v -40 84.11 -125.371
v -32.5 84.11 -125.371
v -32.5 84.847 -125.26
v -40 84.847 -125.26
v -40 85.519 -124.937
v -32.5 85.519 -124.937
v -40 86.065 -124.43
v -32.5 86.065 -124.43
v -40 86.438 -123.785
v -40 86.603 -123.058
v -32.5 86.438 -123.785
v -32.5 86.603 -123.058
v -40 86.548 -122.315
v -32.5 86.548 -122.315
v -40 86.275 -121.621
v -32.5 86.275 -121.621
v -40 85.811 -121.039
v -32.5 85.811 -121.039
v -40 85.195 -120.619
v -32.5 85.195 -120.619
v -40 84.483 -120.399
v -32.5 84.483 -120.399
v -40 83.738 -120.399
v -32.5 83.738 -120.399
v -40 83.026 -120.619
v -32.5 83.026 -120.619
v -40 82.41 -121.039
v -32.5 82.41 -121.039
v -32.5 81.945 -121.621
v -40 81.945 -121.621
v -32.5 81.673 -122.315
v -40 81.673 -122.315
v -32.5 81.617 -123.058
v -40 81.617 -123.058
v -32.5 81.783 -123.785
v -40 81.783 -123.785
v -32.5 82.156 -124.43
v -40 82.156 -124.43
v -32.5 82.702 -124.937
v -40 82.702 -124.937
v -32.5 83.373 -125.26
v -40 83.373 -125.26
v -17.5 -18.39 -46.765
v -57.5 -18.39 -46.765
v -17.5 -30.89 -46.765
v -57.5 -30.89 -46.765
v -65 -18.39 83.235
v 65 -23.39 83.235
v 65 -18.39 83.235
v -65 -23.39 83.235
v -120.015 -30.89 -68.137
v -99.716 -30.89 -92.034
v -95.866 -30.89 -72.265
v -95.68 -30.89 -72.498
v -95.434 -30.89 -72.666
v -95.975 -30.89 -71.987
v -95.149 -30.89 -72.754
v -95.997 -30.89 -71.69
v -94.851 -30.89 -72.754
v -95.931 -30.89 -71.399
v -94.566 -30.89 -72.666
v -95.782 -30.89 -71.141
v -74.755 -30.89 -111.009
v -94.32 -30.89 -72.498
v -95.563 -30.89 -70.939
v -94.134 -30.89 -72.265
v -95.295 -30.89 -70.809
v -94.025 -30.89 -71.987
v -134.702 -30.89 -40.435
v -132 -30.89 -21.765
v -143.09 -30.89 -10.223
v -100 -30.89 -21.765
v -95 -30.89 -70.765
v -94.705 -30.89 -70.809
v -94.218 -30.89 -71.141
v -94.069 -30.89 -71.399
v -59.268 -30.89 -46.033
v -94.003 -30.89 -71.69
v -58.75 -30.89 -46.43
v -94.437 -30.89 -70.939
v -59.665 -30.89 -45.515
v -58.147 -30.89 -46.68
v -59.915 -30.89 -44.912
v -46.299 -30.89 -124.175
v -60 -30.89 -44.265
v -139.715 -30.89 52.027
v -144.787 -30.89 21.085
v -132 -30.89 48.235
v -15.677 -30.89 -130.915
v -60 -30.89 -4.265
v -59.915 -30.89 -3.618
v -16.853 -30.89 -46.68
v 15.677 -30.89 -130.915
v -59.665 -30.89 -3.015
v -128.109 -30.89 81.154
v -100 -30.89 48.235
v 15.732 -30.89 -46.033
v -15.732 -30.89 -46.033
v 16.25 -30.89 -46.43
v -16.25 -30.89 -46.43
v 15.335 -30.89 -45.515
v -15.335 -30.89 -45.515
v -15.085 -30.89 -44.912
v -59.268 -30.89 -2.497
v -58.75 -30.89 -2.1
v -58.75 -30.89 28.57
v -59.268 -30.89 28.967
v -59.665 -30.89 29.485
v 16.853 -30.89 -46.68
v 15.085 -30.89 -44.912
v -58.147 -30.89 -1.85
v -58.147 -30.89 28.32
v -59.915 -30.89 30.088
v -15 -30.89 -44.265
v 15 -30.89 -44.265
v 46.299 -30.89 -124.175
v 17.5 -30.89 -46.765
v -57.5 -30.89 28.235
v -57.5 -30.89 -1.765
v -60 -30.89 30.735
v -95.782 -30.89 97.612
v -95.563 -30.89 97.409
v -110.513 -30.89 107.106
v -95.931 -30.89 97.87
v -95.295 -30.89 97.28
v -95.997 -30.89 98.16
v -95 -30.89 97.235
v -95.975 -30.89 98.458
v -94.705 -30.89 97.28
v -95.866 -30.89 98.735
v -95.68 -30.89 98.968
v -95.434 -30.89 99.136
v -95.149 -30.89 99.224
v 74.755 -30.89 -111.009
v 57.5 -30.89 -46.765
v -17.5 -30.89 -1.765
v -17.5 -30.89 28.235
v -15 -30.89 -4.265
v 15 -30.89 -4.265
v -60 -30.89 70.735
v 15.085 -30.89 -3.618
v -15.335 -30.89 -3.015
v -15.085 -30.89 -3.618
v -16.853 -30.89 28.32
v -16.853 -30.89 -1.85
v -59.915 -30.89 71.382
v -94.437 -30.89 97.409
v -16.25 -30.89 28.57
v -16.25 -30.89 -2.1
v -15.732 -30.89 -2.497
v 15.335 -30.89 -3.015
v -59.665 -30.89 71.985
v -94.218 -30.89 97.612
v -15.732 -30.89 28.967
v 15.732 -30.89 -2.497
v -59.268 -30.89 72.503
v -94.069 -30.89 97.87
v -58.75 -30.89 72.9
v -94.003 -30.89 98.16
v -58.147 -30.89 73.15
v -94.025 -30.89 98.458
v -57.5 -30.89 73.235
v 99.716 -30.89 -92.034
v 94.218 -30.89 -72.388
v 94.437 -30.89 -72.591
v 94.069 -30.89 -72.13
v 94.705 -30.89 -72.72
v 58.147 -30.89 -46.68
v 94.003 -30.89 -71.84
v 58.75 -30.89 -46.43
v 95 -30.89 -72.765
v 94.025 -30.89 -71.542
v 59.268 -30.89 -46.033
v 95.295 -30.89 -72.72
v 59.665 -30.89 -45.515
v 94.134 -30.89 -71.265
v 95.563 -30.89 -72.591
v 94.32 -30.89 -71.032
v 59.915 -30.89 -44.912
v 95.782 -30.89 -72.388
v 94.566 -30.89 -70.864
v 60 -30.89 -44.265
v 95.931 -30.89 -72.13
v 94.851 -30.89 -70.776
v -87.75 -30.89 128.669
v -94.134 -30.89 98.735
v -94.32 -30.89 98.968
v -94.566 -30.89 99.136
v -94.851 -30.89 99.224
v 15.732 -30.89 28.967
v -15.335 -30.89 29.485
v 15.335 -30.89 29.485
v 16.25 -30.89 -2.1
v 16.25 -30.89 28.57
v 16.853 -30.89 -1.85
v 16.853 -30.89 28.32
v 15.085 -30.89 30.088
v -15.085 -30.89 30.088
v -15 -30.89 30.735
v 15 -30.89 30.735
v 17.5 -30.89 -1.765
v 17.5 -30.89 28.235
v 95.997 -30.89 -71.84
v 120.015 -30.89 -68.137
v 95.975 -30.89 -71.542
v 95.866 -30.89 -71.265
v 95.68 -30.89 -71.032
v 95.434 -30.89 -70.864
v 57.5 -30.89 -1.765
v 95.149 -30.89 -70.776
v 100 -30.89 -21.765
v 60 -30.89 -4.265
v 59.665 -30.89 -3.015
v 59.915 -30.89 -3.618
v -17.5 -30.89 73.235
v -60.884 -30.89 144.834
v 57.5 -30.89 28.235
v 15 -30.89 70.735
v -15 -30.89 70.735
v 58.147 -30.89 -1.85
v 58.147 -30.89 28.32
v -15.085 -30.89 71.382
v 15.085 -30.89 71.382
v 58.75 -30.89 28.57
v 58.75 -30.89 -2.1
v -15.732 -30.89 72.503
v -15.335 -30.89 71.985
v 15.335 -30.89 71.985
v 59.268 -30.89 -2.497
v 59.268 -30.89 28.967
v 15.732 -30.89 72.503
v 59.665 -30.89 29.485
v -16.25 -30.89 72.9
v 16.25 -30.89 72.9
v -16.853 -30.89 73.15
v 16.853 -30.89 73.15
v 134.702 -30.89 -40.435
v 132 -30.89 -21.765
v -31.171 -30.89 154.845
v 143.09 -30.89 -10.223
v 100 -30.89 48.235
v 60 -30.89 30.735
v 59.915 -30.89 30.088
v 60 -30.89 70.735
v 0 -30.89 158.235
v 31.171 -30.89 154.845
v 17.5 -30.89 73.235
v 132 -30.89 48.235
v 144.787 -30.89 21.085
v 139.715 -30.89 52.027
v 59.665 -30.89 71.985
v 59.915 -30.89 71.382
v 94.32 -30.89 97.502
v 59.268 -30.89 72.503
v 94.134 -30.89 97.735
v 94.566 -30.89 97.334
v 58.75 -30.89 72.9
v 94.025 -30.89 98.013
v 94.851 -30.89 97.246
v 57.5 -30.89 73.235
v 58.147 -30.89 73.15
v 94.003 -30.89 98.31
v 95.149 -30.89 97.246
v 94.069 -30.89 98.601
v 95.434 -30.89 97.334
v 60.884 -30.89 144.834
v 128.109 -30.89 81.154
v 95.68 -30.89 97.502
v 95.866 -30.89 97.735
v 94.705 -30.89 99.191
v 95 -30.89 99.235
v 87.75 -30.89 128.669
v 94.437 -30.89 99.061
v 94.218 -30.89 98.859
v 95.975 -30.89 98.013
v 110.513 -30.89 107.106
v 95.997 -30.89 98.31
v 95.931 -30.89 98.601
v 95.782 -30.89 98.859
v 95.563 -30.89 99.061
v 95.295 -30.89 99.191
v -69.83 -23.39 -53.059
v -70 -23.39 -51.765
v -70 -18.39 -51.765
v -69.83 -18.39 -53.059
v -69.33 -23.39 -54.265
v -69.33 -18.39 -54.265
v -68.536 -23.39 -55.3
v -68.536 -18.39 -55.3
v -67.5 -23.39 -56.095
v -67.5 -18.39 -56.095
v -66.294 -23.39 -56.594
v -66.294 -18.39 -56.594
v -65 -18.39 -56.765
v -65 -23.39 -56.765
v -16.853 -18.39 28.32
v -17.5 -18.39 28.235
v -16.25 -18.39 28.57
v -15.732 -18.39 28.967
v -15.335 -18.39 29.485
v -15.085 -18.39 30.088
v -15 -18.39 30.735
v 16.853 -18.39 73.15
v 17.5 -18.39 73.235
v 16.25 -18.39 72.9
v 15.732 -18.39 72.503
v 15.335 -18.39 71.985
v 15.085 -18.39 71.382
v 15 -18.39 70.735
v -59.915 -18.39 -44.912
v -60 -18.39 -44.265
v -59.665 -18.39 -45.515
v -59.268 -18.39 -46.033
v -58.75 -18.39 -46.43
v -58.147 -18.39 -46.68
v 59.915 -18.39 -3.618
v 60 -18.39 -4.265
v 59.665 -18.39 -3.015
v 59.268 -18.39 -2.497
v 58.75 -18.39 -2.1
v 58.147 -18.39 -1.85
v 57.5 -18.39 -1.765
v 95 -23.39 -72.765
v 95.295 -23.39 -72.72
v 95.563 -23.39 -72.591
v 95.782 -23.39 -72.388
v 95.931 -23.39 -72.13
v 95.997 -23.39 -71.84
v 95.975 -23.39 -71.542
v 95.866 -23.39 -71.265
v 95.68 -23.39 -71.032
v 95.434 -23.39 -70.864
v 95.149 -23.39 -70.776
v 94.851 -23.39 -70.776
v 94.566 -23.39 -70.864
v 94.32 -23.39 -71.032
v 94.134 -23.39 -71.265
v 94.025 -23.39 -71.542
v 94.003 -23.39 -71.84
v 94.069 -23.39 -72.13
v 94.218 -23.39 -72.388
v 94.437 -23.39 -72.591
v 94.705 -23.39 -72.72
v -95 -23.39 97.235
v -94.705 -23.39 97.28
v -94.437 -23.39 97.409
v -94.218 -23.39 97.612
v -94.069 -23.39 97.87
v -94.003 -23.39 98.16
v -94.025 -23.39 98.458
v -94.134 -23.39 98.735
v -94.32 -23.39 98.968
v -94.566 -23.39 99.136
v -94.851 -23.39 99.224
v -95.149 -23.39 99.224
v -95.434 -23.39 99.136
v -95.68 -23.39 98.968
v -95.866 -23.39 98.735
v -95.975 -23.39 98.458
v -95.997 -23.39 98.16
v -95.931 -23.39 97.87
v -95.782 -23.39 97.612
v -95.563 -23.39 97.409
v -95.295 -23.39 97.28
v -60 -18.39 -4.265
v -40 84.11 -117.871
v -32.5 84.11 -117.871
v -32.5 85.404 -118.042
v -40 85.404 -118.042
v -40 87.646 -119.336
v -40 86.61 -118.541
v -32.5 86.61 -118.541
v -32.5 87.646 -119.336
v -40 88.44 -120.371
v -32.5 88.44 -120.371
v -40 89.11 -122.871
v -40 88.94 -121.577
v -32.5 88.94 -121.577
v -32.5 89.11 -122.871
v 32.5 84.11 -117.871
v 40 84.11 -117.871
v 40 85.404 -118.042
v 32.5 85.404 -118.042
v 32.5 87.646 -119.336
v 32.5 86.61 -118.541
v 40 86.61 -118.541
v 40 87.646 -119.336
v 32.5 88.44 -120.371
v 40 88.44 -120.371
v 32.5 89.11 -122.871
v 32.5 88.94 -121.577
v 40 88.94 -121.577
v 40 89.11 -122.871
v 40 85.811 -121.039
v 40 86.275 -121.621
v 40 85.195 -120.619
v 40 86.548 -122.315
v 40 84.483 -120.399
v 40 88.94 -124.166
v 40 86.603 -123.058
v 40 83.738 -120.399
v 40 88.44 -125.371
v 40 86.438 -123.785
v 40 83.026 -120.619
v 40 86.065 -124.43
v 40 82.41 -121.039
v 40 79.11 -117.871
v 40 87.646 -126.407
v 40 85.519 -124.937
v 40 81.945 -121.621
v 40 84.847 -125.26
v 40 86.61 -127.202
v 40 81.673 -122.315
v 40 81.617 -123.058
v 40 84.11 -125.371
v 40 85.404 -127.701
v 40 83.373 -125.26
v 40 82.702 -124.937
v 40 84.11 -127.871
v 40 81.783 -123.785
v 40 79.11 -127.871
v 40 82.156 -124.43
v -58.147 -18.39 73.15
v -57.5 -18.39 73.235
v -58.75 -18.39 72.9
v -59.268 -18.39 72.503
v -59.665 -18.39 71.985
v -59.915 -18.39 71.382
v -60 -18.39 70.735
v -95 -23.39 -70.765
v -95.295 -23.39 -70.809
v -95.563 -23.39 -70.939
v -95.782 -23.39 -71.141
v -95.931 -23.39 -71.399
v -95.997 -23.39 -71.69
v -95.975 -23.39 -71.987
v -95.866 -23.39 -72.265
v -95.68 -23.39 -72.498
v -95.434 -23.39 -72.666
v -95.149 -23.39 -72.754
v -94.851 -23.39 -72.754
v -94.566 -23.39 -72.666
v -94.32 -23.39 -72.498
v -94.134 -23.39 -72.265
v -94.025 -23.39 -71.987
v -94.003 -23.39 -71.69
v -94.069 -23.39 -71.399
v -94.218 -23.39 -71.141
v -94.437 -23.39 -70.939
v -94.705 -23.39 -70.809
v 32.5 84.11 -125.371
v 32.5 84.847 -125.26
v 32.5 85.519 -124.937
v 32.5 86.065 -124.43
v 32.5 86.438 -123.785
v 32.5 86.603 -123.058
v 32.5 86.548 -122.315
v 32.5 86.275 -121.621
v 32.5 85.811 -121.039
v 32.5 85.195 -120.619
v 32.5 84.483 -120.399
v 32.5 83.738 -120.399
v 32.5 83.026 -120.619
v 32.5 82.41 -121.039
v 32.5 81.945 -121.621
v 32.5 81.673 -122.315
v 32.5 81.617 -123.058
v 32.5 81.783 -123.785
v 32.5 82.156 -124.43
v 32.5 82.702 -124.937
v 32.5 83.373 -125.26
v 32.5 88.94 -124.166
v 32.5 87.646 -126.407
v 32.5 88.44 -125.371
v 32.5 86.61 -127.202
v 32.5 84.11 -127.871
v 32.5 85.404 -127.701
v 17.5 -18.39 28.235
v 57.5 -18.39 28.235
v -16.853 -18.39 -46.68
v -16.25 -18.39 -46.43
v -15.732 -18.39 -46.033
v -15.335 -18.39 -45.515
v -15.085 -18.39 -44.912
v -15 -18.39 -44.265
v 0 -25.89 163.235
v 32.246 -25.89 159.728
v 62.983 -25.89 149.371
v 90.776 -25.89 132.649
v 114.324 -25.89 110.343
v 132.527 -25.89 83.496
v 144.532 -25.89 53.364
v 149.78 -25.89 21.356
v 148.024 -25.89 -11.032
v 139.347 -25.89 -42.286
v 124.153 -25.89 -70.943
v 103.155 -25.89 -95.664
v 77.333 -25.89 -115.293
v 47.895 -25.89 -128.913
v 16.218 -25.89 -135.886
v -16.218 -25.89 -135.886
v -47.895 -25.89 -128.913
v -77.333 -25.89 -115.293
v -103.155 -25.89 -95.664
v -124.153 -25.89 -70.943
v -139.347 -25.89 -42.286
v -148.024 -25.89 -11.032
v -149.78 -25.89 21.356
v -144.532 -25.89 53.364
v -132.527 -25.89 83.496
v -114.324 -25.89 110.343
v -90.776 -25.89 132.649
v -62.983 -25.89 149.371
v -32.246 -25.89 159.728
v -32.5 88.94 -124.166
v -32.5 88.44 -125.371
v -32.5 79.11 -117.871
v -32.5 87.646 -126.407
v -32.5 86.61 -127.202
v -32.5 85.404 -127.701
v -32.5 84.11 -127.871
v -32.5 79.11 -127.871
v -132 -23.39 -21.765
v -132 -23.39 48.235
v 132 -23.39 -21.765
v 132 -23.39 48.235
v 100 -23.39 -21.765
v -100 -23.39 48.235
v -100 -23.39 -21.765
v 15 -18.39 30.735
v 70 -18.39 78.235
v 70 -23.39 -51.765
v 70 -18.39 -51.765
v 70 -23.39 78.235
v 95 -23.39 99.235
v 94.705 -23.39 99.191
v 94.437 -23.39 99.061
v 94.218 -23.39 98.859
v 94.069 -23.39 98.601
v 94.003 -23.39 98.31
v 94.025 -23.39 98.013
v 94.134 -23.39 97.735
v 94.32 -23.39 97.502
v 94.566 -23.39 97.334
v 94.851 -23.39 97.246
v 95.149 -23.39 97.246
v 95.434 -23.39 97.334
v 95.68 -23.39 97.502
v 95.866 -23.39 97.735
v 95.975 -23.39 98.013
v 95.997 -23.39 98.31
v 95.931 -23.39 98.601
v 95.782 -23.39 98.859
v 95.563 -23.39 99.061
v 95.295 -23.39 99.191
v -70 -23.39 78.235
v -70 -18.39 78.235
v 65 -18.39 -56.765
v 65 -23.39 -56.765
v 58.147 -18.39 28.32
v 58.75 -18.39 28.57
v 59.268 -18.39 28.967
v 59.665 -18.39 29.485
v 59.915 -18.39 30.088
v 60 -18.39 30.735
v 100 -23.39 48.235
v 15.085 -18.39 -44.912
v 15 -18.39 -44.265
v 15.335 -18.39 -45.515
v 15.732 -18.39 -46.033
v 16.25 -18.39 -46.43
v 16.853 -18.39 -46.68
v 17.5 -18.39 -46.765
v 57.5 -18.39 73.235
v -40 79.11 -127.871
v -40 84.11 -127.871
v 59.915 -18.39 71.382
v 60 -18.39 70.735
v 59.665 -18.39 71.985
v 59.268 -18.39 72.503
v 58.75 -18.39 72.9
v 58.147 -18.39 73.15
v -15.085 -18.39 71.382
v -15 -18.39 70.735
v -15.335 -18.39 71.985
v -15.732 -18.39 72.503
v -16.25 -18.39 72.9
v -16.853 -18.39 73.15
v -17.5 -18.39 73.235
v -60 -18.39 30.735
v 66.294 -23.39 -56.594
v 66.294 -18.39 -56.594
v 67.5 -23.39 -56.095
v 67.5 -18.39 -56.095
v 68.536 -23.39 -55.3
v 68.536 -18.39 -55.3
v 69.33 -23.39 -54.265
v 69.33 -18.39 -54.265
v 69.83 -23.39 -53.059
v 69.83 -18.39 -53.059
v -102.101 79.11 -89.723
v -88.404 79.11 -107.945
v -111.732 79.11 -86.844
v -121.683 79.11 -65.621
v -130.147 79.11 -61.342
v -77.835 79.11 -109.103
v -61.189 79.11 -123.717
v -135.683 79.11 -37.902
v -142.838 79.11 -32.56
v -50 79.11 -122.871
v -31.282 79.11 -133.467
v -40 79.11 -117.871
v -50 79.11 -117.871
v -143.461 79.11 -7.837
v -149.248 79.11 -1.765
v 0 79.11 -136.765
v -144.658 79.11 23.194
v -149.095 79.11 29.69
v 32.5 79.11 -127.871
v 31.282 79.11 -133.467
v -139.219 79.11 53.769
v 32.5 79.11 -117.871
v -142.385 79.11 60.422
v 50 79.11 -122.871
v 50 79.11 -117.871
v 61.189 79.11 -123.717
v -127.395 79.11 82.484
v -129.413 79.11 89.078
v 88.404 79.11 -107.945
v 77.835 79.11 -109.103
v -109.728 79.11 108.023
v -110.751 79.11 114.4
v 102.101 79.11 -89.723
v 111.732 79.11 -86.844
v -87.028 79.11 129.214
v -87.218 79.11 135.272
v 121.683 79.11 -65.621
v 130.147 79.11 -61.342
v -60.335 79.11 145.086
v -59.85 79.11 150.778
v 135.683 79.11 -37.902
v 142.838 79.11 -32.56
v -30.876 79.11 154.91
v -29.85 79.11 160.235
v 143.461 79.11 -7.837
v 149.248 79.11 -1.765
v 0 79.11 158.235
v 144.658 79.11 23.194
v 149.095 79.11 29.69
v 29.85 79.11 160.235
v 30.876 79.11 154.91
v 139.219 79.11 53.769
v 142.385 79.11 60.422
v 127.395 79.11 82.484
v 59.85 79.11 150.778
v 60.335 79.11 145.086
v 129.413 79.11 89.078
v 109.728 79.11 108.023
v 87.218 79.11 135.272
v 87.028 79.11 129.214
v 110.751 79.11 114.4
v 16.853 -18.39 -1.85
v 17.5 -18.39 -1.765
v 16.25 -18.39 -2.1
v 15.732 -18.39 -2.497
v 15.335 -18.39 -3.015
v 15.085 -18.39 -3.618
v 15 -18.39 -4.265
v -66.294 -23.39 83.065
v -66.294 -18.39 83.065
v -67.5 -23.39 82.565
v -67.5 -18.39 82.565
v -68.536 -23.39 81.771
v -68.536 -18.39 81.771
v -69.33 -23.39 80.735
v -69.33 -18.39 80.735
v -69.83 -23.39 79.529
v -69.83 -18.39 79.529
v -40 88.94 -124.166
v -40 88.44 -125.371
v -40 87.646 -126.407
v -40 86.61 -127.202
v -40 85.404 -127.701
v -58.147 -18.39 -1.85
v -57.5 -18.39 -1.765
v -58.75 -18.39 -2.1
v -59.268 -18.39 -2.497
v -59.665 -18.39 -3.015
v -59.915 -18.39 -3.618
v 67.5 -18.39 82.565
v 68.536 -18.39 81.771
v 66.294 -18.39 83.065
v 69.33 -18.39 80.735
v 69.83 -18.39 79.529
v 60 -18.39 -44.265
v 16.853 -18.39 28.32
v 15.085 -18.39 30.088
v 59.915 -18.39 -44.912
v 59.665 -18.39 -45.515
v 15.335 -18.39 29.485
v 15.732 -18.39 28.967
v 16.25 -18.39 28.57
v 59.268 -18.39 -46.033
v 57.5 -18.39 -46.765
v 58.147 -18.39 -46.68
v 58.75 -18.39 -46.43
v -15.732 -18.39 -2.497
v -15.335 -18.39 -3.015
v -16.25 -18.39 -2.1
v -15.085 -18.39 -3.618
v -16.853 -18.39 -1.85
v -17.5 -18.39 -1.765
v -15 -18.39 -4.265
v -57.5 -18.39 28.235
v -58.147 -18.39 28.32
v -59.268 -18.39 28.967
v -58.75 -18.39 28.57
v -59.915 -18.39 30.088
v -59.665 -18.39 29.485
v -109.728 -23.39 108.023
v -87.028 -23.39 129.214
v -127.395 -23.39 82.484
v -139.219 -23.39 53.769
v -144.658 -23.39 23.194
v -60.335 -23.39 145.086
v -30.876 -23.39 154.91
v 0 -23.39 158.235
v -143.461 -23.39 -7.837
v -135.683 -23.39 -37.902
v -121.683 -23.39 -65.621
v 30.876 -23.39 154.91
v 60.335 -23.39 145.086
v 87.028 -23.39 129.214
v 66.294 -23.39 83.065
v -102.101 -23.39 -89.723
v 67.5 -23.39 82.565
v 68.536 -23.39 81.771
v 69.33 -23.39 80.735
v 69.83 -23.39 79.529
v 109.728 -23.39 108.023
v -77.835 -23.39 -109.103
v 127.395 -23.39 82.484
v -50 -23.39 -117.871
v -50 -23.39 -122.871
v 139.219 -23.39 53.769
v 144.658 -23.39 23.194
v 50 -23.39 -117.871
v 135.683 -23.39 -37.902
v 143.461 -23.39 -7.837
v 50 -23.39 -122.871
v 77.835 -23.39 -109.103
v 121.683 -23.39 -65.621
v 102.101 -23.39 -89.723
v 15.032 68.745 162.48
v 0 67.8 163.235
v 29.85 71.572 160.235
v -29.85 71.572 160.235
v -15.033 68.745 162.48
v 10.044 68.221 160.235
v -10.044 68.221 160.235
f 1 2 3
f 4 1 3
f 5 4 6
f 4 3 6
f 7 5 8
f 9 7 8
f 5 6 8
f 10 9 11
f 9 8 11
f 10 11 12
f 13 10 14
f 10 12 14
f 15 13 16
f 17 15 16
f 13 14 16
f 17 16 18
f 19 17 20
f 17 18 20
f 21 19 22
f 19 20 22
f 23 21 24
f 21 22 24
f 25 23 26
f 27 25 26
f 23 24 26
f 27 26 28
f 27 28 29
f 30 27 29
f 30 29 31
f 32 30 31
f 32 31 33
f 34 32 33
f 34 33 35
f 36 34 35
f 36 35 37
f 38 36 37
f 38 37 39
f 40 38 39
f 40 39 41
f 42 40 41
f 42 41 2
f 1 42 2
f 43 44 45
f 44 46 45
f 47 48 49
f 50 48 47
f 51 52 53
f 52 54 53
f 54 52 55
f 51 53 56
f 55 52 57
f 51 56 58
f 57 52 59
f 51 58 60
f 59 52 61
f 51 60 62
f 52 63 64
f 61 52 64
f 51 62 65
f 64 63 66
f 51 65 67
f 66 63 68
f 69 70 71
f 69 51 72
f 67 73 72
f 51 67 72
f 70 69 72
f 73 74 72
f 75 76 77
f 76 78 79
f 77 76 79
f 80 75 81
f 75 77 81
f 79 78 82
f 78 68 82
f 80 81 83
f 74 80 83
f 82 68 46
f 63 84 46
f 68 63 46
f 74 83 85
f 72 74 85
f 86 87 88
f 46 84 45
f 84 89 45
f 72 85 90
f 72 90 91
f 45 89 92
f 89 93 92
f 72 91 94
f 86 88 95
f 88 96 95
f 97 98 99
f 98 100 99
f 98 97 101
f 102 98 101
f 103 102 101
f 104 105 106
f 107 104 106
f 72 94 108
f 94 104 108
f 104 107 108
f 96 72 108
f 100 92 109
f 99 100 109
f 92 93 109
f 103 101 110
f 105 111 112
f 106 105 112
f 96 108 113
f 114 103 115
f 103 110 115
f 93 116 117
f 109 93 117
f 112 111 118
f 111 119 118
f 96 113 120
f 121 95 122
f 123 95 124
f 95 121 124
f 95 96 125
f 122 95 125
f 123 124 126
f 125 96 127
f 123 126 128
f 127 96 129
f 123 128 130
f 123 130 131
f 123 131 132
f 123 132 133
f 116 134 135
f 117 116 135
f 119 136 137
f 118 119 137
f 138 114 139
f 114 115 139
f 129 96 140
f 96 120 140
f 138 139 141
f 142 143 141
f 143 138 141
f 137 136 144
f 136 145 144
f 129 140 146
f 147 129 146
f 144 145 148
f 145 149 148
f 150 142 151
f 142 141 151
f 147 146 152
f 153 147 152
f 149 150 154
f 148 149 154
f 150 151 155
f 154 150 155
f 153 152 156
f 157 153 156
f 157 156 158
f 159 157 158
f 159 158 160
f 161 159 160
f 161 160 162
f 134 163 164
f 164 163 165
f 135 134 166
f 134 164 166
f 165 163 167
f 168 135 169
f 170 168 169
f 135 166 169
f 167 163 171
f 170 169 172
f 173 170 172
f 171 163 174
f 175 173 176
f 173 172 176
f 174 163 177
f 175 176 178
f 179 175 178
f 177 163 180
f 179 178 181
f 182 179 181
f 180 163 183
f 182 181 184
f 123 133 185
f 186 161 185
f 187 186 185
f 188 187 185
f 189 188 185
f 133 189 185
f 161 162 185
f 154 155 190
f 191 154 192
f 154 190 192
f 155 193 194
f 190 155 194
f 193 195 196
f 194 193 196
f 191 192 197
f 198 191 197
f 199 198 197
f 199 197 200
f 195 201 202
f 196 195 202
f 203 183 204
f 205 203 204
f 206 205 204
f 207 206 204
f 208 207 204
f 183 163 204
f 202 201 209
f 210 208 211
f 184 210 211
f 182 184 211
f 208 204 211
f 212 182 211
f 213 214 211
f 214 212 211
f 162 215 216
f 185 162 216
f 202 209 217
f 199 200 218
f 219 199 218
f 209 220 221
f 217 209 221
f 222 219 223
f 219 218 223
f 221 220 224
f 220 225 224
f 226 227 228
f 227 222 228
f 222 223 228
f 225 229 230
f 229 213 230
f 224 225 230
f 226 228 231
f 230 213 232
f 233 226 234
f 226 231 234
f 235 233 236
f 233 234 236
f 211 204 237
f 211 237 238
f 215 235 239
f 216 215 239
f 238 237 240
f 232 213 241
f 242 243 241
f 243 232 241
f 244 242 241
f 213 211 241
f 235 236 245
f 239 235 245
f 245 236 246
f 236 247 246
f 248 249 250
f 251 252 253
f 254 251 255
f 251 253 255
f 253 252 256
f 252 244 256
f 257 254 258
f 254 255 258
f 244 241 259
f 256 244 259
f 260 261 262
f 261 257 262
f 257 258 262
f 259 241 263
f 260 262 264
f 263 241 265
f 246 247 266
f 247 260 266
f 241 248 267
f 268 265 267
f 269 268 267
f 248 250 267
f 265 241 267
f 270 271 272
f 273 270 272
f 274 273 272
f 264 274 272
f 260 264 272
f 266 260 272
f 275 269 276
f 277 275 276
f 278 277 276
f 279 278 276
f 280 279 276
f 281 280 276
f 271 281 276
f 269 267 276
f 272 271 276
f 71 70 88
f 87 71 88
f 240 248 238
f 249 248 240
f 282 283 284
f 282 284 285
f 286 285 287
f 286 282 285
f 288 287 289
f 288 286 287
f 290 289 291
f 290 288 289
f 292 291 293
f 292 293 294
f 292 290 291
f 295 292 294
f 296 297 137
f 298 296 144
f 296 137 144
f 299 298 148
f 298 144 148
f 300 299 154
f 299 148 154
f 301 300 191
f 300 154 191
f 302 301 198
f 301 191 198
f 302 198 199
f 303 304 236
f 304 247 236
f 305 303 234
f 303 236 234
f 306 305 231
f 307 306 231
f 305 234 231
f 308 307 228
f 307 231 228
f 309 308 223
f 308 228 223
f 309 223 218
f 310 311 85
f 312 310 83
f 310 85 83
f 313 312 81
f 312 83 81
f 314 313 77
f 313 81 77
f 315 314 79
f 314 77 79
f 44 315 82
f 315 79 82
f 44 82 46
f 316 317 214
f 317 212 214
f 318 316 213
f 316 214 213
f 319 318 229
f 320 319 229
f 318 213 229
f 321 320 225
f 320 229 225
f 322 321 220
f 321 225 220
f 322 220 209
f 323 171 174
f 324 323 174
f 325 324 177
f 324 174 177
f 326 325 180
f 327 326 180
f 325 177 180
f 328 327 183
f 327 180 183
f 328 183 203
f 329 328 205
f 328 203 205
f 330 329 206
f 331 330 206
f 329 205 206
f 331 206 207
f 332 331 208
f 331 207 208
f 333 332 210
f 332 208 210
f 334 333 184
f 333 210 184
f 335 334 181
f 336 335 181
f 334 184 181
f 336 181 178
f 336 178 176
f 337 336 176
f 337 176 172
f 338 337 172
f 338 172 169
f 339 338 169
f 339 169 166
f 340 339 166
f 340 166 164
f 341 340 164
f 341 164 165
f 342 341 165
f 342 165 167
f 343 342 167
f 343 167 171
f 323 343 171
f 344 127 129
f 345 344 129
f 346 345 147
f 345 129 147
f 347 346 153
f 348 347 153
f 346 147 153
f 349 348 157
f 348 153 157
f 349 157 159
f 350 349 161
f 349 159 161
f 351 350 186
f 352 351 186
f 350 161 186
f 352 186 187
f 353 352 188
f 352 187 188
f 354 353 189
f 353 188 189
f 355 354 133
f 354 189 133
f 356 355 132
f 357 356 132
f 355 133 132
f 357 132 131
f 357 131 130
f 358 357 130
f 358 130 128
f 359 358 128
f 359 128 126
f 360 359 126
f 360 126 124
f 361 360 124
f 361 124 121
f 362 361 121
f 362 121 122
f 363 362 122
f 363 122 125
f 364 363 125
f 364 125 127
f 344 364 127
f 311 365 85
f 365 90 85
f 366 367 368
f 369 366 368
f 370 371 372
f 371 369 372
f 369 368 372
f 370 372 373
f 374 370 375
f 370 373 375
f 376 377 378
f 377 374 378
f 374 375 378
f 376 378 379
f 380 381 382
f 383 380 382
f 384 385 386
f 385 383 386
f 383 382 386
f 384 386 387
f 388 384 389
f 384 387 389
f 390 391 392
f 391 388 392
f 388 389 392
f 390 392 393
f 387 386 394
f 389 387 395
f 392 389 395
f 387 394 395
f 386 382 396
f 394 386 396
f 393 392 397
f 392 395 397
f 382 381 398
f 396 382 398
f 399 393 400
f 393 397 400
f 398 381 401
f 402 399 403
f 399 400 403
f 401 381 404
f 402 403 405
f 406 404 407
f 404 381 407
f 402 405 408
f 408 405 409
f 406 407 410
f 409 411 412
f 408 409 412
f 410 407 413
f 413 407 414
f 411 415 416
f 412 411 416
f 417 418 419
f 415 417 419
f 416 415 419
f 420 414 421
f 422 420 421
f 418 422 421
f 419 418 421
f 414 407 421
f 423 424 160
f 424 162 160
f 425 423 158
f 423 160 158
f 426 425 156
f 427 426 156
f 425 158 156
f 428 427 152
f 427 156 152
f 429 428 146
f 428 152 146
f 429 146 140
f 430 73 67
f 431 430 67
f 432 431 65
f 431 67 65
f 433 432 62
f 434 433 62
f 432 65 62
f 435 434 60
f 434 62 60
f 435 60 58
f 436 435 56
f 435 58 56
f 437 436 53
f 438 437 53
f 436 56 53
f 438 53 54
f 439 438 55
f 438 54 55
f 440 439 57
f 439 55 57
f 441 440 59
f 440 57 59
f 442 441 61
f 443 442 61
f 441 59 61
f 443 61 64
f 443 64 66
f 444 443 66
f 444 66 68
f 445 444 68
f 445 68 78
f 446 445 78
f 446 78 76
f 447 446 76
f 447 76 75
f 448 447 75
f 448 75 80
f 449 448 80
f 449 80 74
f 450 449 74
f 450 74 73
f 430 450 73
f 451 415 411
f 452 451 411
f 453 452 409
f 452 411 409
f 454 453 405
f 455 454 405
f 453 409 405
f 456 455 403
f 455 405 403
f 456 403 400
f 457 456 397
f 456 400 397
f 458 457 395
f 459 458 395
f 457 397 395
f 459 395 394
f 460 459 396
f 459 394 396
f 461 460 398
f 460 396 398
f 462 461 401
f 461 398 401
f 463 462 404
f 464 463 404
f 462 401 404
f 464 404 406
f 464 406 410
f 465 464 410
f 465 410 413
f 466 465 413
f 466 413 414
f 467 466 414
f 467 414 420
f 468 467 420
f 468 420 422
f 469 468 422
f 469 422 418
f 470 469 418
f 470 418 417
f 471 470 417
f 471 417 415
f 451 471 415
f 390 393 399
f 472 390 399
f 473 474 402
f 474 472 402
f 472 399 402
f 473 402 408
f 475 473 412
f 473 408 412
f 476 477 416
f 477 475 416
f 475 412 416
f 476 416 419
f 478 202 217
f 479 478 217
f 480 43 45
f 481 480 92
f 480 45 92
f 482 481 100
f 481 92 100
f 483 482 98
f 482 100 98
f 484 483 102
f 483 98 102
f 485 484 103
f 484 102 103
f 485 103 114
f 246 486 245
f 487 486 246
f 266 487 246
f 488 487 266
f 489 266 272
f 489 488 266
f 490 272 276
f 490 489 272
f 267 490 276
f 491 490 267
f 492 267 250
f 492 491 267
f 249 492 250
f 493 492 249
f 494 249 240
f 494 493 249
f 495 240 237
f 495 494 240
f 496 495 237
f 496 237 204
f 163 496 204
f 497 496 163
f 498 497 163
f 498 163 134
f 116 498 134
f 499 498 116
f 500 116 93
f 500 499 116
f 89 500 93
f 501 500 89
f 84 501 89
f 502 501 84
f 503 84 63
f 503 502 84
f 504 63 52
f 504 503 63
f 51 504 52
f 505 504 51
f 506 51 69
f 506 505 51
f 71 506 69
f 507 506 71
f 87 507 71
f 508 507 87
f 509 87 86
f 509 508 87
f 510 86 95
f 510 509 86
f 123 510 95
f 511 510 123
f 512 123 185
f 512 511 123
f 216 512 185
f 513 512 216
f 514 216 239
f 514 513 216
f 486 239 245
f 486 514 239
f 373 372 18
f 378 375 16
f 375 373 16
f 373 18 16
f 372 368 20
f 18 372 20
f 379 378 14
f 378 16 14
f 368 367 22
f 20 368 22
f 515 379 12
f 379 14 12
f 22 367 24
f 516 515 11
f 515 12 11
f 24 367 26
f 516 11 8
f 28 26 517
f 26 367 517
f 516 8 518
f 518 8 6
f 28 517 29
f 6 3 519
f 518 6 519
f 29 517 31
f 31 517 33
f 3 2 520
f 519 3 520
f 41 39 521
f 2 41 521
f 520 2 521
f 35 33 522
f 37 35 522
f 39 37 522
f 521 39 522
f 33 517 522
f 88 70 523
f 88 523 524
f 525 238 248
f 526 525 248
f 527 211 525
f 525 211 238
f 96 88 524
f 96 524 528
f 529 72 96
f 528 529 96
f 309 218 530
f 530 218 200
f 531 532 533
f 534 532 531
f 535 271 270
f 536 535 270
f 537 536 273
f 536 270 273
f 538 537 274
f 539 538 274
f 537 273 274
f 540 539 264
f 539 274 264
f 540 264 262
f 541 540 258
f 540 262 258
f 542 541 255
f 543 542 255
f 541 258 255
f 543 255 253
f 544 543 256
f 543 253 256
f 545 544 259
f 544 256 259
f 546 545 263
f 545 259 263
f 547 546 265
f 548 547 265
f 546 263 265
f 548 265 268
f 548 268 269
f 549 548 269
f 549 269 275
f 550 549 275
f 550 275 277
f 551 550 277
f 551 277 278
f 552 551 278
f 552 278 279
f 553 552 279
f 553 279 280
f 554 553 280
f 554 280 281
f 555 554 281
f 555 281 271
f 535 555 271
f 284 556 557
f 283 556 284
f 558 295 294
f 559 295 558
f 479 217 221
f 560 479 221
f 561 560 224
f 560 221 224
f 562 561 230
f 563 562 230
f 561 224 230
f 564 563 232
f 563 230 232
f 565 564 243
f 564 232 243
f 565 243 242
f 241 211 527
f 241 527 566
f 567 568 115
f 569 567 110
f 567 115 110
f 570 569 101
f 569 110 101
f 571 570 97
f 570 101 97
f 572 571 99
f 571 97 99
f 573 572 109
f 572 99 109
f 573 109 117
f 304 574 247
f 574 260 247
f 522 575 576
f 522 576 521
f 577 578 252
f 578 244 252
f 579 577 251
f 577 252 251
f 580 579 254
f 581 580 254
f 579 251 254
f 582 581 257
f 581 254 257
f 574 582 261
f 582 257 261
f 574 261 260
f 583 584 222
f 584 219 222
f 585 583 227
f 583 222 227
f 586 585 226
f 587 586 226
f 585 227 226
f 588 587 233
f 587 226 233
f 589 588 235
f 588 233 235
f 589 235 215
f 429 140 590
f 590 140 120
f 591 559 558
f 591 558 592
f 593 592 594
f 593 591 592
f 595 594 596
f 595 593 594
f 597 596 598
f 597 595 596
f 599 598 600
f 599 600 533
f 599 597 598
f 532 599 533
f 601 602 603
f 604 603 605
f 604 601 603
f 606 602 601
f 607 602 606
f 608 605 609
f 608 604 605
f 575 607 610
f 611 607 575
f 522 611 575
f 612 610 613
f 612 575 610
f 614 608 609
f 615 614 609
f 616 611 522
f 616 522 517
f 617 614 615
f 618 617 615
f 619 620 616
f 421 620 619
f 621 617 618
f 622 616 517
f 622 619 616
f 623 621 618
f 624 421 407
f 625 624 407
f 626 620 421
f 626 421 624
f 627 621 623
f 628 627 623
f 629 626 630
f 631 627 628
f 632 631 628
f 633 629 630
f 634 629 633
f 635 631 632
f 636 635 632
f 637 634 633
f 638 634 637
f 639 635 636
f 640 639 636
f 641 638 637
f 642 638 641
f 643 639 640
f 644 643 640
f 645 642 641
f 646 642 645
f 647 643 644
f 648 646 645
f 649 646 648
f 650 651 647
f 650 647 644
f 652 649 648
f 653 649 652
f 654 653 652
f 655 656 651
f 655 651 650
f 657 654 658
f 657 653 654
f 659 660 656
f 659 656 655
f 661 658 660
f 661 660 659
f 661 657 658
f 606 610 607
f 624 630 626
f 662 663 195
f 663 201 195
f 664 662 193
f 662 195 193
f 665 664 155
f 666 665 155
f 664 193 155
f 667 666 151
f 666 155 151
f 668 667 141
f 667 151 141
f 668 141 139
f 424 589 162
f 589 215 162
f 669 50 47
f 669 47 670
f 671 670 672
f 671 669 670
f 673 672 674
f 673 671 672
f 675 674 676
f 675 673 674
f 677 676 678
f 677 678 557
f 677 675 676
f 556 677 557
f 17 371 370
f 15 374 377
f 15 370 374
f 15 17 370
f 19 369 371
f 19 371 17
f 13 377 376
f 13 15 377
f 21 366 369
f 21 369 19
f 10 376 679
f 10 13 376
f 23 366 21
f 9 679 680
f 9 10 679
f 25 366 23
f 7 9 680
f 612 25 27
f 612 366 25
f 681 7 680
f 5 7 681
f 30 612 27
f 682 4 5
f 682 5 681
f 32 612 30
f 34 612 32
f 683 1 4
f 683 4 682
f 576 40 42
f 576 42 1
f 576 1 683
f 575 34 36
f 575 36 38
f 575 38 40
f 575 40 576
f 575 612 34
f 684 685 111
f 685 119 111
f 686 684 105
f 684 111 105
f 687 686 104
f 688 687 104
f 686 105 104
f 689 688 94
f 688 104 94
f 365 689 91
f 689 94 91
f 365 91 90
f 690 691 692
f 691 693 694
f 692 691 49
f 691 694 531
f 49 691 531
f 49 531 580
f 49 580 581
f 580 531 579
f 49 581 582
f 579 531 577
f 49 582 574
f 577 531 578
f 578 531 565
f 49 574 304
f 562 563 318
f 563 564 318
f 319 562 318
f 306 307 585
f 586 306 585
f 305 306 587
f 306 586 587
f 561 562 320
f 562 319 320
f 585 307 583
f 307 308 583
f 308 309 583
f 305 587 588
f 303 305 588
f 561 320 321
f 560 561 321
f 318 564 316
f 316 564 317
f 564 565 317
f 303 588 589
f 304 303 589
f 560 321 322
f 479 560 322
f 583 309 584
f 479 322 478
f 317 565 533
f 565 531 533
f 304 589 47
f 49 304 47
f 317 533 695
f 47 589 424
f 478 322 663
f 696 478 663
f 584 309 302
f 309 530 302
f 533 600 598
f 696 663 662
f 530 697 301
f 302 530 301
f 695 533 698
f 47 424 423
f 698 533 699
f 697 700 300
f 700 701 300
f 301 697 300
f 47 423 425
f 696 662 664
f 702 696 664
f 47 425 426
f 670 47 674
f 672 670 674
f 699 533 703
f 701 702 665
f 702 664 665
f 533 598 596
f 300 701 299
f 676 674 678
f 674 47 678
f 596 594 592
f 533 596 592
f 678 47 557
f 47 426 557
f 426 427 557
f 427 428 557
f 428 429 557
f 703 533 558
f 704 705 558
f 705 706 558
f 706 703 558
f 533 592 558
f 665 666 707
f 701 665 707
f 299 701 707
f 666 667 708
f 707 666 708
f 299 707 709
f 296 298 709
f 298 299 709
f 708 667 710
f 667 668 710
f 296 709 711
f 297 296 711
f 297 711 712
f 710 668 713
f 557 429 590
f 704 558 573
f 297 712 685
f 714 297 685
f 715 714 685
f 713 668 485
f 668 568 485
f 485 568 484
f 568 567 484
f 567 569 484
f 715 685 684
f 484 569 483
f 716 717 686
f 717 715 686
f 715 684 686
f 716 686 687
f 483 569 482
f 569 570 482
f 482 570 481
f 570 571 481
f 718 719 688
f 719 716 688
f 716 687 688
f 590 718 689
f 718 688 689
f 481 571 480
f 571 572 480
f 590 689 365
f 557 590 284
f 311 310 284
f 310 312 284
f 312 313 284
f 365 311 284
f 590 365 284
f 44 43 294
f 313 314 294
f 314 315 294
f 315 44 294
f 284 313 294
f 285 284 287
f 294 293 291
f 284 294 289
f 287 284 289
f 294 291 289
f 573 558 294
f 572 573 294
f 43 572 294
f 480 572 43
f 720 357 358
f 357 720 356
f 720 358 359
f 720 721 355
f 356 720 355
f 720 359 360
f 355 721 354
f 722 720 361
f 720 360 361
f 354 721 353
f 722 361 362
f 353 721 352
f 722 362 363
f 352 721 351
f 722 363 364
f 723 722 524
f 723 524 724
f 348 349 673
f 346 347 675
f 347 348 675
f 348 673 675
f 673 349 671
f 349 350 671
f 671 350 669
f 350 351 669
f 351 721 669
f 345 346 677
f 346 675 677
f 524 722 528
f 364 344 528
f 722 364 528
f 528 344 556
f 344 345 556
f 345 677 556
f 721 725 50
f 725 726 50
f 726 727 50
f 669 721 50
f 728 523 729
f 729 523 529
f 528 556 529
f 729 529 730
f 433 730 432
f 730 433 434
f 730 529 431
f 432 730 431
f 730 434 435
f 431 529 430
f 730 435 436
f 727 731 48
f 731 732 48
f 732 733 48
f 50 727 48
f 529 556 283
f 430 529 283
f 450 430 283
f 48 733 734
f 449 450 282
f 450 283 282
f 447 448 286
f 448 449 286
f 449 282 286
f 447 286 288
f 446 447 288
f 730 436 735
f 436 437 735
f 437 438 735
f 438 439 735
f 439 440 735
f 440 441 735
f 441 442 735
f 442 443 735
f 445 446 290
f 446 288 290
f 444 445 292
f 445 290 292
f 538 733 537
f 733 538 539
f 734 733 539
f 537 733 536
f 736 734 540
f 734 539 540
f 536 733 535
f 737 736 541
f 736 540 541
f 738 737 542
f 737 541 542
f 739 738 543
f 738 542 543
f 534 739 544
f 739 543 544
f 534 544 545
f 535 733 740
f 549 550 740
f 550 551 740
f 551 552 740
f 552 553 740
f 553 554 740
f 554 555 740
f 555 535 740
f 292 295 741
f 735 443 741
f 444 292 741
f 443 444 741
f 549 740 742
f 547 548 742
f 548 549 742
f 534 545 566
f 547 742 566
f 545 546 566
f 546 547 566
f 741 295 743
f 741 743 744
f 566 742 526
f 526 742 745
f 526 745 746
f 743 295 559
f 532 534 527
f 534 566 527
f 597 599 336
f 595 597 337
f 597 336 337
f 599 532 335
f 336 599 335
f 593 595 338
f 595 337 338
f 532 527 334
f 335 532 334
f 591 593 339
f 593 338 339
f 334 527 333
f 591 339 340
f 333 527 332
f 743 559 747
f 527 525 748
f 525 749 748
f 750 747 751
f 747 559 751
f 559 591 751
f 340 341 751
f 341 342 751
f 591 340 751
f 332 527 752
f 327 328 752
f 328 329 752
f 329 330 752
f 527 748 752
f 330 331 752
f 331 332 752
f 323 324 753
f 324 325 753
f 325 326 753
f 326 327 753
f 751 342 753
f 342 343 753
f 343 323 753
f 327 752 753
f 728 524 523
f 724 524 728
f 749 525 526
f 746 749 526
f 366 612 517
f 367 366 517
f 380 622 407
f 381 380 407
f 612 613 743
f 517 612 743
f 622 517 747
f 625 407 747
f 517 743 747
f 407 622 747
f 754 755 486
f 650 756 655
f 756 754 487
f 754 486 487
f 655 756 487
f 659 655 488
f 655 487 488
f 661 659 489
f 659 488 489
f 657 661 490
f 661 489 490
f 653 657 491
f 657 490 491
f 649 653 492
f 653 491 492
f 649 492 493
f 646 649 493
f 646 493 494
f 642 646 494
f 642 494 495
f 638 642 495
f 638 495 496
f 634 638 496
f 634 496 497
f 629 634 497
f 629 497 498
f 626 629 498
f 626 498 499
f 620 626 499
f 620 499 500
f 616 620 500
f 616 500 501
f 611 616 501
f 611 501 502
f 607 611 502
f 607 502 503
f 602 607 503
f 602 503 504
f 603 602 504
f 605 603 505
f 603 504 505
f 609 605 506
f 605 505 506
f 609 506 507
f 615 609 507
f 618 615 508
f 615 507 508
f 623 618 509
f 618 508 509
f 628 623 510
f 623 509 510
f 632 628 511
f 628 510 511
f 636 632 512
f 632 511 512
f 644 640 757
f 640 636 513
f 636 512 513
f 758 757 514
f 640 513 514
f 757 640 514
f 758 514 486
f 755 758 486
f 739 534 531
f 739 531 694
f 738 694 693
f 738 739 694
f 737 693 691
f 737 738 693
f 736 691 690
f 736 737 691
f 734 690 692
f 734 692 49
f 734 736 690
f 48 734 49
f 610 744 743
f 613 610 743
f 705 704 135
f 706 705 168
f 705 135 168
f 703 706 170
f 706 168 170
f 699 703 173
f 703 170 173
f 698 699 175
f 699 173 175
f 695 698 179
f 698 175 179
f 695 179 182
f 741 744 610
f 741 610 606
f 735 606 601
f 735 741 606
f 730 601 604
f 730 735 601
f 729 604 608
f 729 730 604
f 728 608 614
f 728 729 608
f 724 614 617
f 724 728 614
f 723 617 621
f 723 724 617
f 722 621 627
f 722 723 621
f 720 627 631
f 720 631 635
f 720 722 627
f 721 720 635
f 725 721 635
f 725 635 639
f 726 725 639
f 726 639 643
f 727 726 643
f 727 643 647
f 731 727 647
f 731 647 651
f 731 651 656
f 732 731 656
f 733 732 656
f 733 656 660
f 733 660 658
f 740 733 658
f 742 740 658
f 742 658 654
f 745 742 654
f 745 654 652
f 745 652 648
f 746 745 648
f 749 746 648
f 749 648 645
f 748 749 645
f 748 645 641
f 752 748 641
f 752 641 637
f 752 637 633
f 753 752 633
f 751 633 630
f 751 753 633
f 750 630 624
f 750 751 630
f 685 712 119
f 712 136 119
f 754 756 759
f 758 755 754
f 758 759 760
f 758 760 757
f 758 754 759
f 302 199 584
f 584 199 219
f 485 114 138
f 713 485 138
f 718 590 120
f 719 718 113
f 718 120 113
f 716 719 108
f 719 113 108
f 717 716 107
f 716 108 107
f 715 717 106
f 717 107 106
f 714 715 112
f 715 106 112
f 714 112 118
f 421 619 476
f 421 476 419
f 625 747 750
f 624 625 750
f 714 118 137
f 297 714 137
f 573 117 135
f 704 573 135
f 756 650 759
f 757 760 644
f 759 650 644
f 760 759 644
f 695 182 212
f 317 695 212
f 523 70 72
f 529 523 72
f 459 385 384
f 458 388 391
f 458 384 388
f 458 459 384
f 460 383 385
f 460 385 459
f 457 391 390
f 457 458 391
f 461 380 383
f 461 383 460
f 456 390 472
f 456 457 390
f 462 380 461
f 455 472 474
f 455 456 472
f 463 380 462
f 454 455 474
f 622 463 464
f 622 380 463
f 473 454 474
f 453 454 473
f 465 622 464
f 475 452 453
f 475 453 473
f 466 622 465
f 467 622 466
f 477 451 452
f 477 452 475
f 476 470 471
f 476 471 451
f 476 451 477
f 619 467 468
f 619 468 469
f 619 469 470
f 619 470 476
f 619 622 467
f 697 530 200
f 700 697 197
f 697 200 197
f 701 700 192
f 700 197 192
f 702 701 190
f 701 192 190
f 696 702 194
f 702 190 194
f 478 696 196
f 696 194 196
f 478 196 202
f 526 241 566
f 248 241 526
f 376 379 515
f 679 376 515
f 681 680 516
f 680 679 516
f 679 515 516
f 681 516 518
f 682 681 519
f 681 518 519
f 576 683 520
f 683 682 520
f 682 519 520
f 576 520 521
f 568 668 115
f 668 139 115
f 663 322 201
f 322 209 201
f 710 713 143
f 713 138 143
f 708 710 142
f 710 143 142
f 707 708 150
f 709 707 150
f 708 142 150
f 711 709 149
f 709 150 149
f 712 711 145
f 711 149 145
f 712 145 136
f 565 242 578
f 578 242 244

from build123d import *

# Parameters (mm, degrees)
SKETCH1_R                 = 15
BOSS_EXTRUDE1_DEPTH       = 11
SHELL1_T                  = -0.5
SHELL1_THICKNESS_2_FACE_R = 14.5
SHELL1_THICKNESS_2_DEPTH  = 0.25
CUT_EXTRUDE1_REACH        = 25.896
SKETCH2_R                 = 0.1
SKETCH2_W                 = 4.5
SKETCH2_H                 = 4.5
SKETCH2_W_2               = 3.2
SKETCH2_H_2               = 7
CHAMFER1_SIZE             = 0.5
FILLET1_R                 = 0.25
CUT_EXTRUDE2_START        = 15
CUT_EXTRUDE2_DEPTH        = 0.3
BOSS_EXTRUDE2_DEPTH       = 10.25
SKETCH7_W                 = 0.75
SKETCH7_H                 = 1
BOSS_EXTRUDE3_DEPTH       = 1
SKETCH8_R                 = 0.25
CUT_EXTRUDE3_DEPTH        = 28.018512298
BOSS_EXTRUDE5_DEPTH       = 0.5
MIRROR2_COPY_1_DEPTH      = 0.5
SCALE1_SCALE              = 10


with BuildPart() as part:
    # Sketch1 → Boss-Extrude1 (new body)
    with BuildSketch(Plane(origin=(0, 0, 0), x_dir=(1, 0, 0), z_dir=(0, 1, 0))):
        with Locations(Location((0, 0, 0), (0, 0, 270))):
            Circle(SKETCH1_R)
    extrude(amount=BOSS_EXTRUDE1_DEPTH)

    # Shell1
    shell1_openings = [part.faces().sort_by_distance(p)[0] for p in [
        (0, 11, 0),
    ]]
    offset(amount=SHELL1_T, openings=shell1_openings, kind=Kind.INTERSECTION)

    # Shell1 thickness 2 face (on inner face of the shell) → Shell1 thickness 2 (add)
    with BuildSketch(Plane(origin=(0, 0.5, 0), x_dir=(0, 0, -1), z_dir=(0, -1, 0))):
        Circle(SHELL1_THICKNESS_2_FACE_R)
    extrude(amount=-SHELL1_THICKNESS_2_DEPTH)

    # Sketch2 → Cut-Extrude1 (cut, up to next)
    with BuildSketch(Plane.XZ, mode=Mode.PRIVATE) as cut_extrude1_sk1:
        with Locations(Location((-9.5, 8.5, 0), (0, 0, 270))):
            Circle(SKETCH2_R)
    cut_extrude1_tool1 = extrude(cut_extrude1_sk1.sketch, amount=-CUT_EXTRUDE1_REACH, mode=Mode.PRIVATE) & part.part
    # Sketch2 → Cut-Extrude1 (cut, up to next)
    with BuildSketch(Plane.XZ, mode=Mode.PRIVATE) as cut_extrude1_sk2:
        with Locations(Location((-9.5, -8.5, 0), (0, 0, 90))):
            Circle(SKETCH2_R)
    cut_extrude1_tool2 = extrude(cut_extrude1_sk2.sketch, amount=-CUT_EXTRUDE1_REACH, mode=Mode.PRIVATE) & part.part
    # Sketch2 → Cut-Extrude1 (cut, up to next)
    with BuildSketch(Plane.XZ, mode=Mode.PRIVATE) as cut_extrude1_sk3:
        with Locations(Location((9.5, 8.5, 0), (0, 0, 90))):
            Circle(SKETCH2_R)
    cut_extrude1_tool3 = extrude(cut_extrude1_sk3.sketch, amount=-CUT_EXTRUDE1_REACH, mode=Mode.PRIVATE) & part.part
    # Sketch2 → Cut-Extrude1 (cut, up to next)
    with BuildSketch(Plane.XZ, mode=Mode.PRIVATE) as cut_extrude1_sk4:
        with Locations(Location((9.5, -8.5, 0), (0, 0, 270))):
            Circle(SKETCH2_R)
    cut_extrude1_tool4 = extrude(cut_extrude1_sk4.sketch, amount=-CUT_EXTRUDE1_REACH, mode=Mode.PRIVATE) & part.part
    # Sketch2 → Cut-Extrude1 (cut, up to next)
    with BuildSketch(Plane.XZ, mode=Mode.PRIVATE) as cut_extrude1_sk5:
        with Locations((-3.75, 3.75)):
            Rectangle(SKETCH2_W, SKETCH2_H)
    cut_extrude1_tool5 = extrude(cut_extrude1_sk5.sketch, amount=-CUT_EXTRUDE1_REACH, mode=Mode.PRIVATE) & part.part
    # Sketch2 → Cut-Extrude1 (cut, up to next)
    with BuildSketch(Plane.XZ, mode=Mode.PRIVATE) as cut_extrude1_sk6:
        with Locations((-3.75, -3.75)):
            Rectangle(SKETCH2_W, SKETCH2_H)
    cut_extrude1_tool6 = extrude(cut_extrude1_sk6.sketch, amount=-CUT_EXTRUDE1_REACH, mode=Mode.PRIVATE) & part.part
    # Sketch2 → Cut-Extrude1 (cut, up to next)
    with BuildSketch(Plane.XZ, mode=Mode.PRIVATE) as cut_extrude1_sk7:
        with Locations((11.6, 0)):
            Rectangle(SKETCH2_W_2, SKETCH2_H_2)
    cut_extrude1_tool7 = extrude(cut_extrude1_sk7.sketch, amount=-CUT_EXTRUDE1_REACH, mode=Mode.PRIVATE) & part.part
    # Sketch2 → Cut-Extrude1 (cut, up to next)
    with BuildSketch(Plane.XZ, mode=Mode.PRIVATE) as cut_extrude1_sk8:
        with Locations((-11.6, 0)):
            Rectangle(SKETCH2_W_2, SKETCH2_H_2)
    cut_extrude1_tool8 = extrude(cut_extrude1_sk8.sketch, amount=-CUT_EXTRUDE1_REACH, mode=Mode.PRIVATE) & part.part
    # Sketch2 → Cut-Extrude1 (cut, up to next)
    with BuildSketch(Plane.XZ, mode=Mode.PRIVATE) as cut_extrude1_sk9:
        with Locations((3.75, -3.75)):
            Rectangle(SKETCH2_W, SKETCH2_H)
    cut_extrude1_tool9 = extrude(cut_extrude1_sk9.sketch, amount=-CUT_EXTRUDE1_REACH, mode=Mode.PRIVATE) & part.part
    # Sketch2 → Cut-Extrude1 (cut, up to next)
    with BuildSketch(Plane.XZ, mode=Mode.PRIVATE) as cut_extrude1_sk10:
        with Locations((3.75, 3.75)):
            Rectangle(SKETCH2_W, SKETCH2_H)
    cut_extrude1_tool10 = extrude(cut_extrude1_sk10.sketch, amount=-CUT_EXTRUDE1_REACH, mode=Mode.PRIVATE) & part.part
    add(cut_extrude1_tool1.solids().sort_by_distance((-9.5, 0, 8.5))[0], mode=Mode.SUBTRACT)
    add(cut_extrude1_tool2.solids().sort_by_distance((-9.5, 0, -8.5))[0], mode=Mode.SUBTRACT)
    add(cut_extrude1_tool3.solids().sort_by_distance((9.5, 0, 8.5))[0], mode=Mode.SUBTRACT)
    add(cut_extrude1_tool4.solids().sort_by_distance((9.5, 0, -8.5))[0], mode=Mode.SUBTRACT)
    add(cut_extrude1_tool5.solids().sort_by_distance((-3.75, 0, 3.75))[0], mode=Mode.SUBTRACT)
    add(cut_extrude1_tool6.solids().sort_by_distance((-3.75, 0, -3.75))[0], mode=Mode.SUBTRACT)
    add(cut_extrude1_tool7.solids().sort_by_distance((11.6, 0, 0))[0], mode=Mode.SUBTRACT)
    add(cut_extrude1_tool8.solids().sort_by_distance((-11.6, 0, 0))[0], mode=Mode.SUBTRACT)
    add(cut_extrude1_tool9.solids().sort_by_distance((3.75, 0, -3.75))[0], mode=Mode.SUBTRACT)
    add(cut_extrude1_tool10.solids().sort_by_distance((3.75, 0, 3.75))[0], mode=Mode.SUBTRACT)

    # Chamfer1
    chamfer1_edges = [part.edges().sort_by_distance(p)[0] for p in [
        (0, 0, -15),
    ]]
    chamfer(chamfer1_edges, length=CHAMFER1_SIZE)

    # Fillet1
    fillet1_edges = [part.edges().sort_by_distance(p)[0] for p in [
        (-1.5, 0.375, -6),
        (-6, 0.375, -6),
        (-6, 0.375, -1.5),
        (-1.5, 0.375, -1.5),
        (6, 0.375, -1.5),
        (6, 0.375, -6),
        (1.5, 0.375, -6),
        (1.5, 0.375, -1.5),
        (1.5, 0.375, 6),
        (6, 0.375, 6),
        (6, 0.375, 1.5),
        (1.5, 0.375, 1.5),
        (-6, 0.375, 1.5),
        (-6, 0.375, 6),
        (-1.5, 0.375, 6),
        (-1.5, 0.375, 1.5),
    ]]
    fillet(fillet1_edges, radius=FILLET1_R)

    # Sketch4 → Cut-Extrude2 (cut)
    with BuildSketch(Plane.XY.offset(CUT_EXTRUDE2_START)):
        with BuildLine():
            Line((-3, 11), (3, 11))
            Line((3, 11), (3, 10.25))
            ThreePointArc((3, 10.25), (0, 9.868950039), (-3, 10.25))
            Line((-3, 10.25), (-3, 11))
        make_face()
    extrude(amount=-CUT_EXTRUDE2_DEPTH, mode=Mode.SUBTRACT)

    # Sketch5 → Boss-Extrude2 (add)
    with BuildSketch(Plane(origin=(0, 0.75, 0), x_dir=(1, 0, 0), z_dir=(0, 1, 0))):
        with BuildLine():
            Line((-5, 13.610657589), (-5, 13.110657589))
            Line((-5, 13.110657589), (5, 13.110657589))
            Line((5, 13.110657589), (5, 13.610657589))
            ThreePointArc((5, 13.610657589), (0, 14.5), (-5, 13.610657589))
        make_face()
    extrude(amount=BOSS_EXTRUDE2_DEPTH)

    # Sketch7 → Boss-Extrude3 (add)
    with BuildSketch(Plane(origin=(0, 11, 0), x_dir=(1, 0, 0), z_dir=(0, 1, 0))):
        with Locations((3.625, 13.610657589)):
            Rectangle(SKETCH7_W, SKETCH7_H)
        with Locations((-3.625, 13.610657589)):
            Rectangle(SKETCH7_W, SKETCH7_H)
    extrude(amount=BOSS_EXTRUDE3_DEPTH)

    # Sketch8 → Cut-Extrude3 (cut, through all)
    with BuildSketch(Plane(origin=(4, 0, 0), x_dir=(0, 0, -1), z_dir=(1, 0, 0))):
        with BuildLine():
            Line((13.110657589, 12), (13.110657589, 11.5))
            ThreePointArc((13.110657589, 11.5), (13.257104198, 11.853553391), (13.610657589, 12))
            Line((13.610657589, 12), (13.110657589, 12))
        make_face()
        with BuildLine():
            Line((14.110657589, 12), (13.610657589, 12))
            ThreePointArc((13.610657589, 12), (13.964210979, 11.853553391), (14.110657589, 11.5))
            Line((14.110657589, 11.5), (14.110657589, 12))
        make_face()
        with Locations((13.610657589, 11.5)):
            Circle(SKETCH8_R)
    extrude(amount=-CUT_EXTRUDE3_DEPTH, mode=Mode.SUBTRACT)

    # Sketch10 → Boss-Extrude5 (add)
    with BuildSketch(Plane(origin=(0, 0.75, 0), x_dir=(1, 0, 0), z_dir=(0, 1, 0))):
        with BuildLine():
            Line((-6.5, 7), (6.5, 7))
            ThreePointArc((6.5, 7), (6.853553391, 6.853553391), (7, 6.5))
            Line((7, 6.5), (7, -6.5))
            ThreePointArc((7, -6.5), (6.853553391, -6.853553391), (6.5, -7))
            Line((6.5, -7), (-6.5, -7))
            ThreePointArc((-6.5, -7), (-6.853553391, -6.853553391), (-7, -6.5))
            Line((-7, -6.5), (-7, 6.5))
            ThreePointArc((-7, 6.5), (-6.853553391, 6.853553391), (-6.5, 7))
        make_face()
        with BuildLine():
            Line((-1.5, -1.75), (-1.5, -5.75))
            ThreePointArc((-1.5, -5.75), (-1.573223305, -5.926776695), (-1.75, -6))
            Line((-1.75, -6), (-5.75, -6))
            ThreePointArc((-5.75, -6), (-5.926776695, -5.926776695), (-6, -5.75))
            Line((-6, -5.75), (-6, -1.75))
            ThreePointArc((-6, -1.75), (-5.926776695, -1.573223305), (-5.75, -1.5))
            Line((-5.75, -1.5), (-1.75, -1.5))
            ThreePointArc((-1.75, -1.5), (-1.573223305, -1.573223305), (-1.5, -1.75))
        make_face(mode=Mode.SUBTRACT)
        with BuildLine():
            Line((6, -1.75), (6, -5.75))
            ThreePointArc((6, -5.75), (5.926776695, -5.926776695), (5.75, -6))
            Line((5.75, -6), (1.75, -6))
            ThreePointArc((1.75, -6), (1.573223305, -5.926776695), (1.5, -5.75))
            Line((1.5, -5.75), (1.5, -1.75))
            ThreePointArc((1.5, -1.75), (1.573223305, -1.573223305), (1.75, -1.5))
            Line((1.75, -1.5), (5.75, -1.5))
            ThreePointArc((5.75, -1.5), (5.926776695, -1.573223305), (6, -1.75))
        make_face(mode=Mode.SUBTRACT)
        with BuildLine():
            Line((6, 5.75), (6, 1.75))
            ThreePointArc((6, 1.75), (5.926776695, 1.573223305), (5.75, 1.5))
            Line((5.75, 1.5), (1.75, 1.5))
            ThreePointArc((1.75, 1.5), (1.573223305, 1.573223305), (1.5, 1.75))
            Line((1.5, 1.75), (1.5, 5.75))
            ThreePointArc((1.5, 5.75), (1.573223305, 5.926776695), (1.75, 6))
            Line((1.75, 6), (5.75, 6))
            ThreePointArc((5.75, 6), (5.926776695, 5.926776695), (6, 5.75))
        make_face(mode=Mode.SUBTRACT)
        with BuildLine():
            Line((-1.5, 5.75), (-1.5, 1.75))
            ThreePointArc((-1.5, 1.75), (-1.573223305, 1.573223305), (-1.75, 1.5))
            Line((-1.75, 1.5), (-5.75, 1.5))
            ThreePointArc((-5.75, 1.5), (-5.926776695, 1.573223305), (-6, 1.75))
            Line((-6, 1.75), (-6, 5.75))
            ThreePointArc((-6, 5.75), (-5.926776695, 5.926776695), (-5.75, 6))
            Line((-5.75, 6), (-1.75, 6))
            ThreePointArc((-1.75, 6), (-1.573223305, 5.926776695), (-1.5, 5.75))
        make_face(mode=Mode.SUBTRACT)
    boss_extrude5 = extrude(amount=BOSS_EXTRUDE5_DEPTH)

    # Mirror1: Boss-Extrude5 across plane
    add(boss_extrude5.mirror(Plane(origin=(0, 0, 0), x_dir=(0, 0, 1), z_dir=(1, 0, 0))))

    # Mirror2: Boss-Extrude5 across plane
    add(boss_extrude5.mirror(Plane.XY))

    # Mirror2 copy 1 sketch → Mirror2 copy 1 (add)
    with BuildSketch(Plane(origin=(0, 0.75, 0), x_dir=(-1, 0, 0), z_dir=(0, 1, 0))):
        with BuildLine():
            Line((-6.5, 7), (6.5, 7))
            ThreePointArc((6.5, 7), (6.853553391, 6.853553391), (7, 6.5))
            Line((7, 6.5), (7, -6.5))
            ThreePointArc((7, -6.5), (6.853553391, -6.853553391), (6.5, -7))
            Line((6.5, -7), (-6.5, -7))
            ThreePointArc((-6.5, -7), (-6.853553391, -6.853553391), (-7, -6.5))
            Line((-7, -6.5), (-7, 6.5))
            ThreePointArc((-7, 6.5), (-6.853553391, 6.853553391), (-6.5, 7))
        make_face()
        with BuildLine():
            Line((-1.5, -1.75), (-1.5, -5.75))
            ThreePointArc((-1.5, -5.75), (-1.573223305, -5.926776695), (-1.75, -6))
            Line((-1.75, -6), (-5.75, -6))
            ThreePointArc((-5.75, -6), (-5.926776695, -5.926776695), (-6, -5.75))
            Line((-6, -5.75), (-6, -1.75))
            ThreePointArc((-6, -1.75), (-5.926776695, -1.573223305), (-5.75, -1.5))
            Line((-5.75, -1.5), (-1.75, -1.5))
            ThreePointArc((-1.75, -1.5), (-1.573223305, -1.573223305), (-1.5, -1.75))
        make_face(mode=Mode.SUBTRACT)
        with BuildLine():
            Line((6, -1.75), (6, -5.75))
            ThreePointArc((6, -5.75), (5.926776695, -5.926776695), (5.75, -6))
            Line((5.75, -6), (1.75, -6))
            ThreePointArc((1.75, -6), (1.573223305, -5.926776695), (1.5, -5.75))
            Line((1.5, -5.75), (1.5, -1.75))
            ThreePointArc((1.5, -1.75), (1.573223305, -1.573223305), (1.75, -1.5))
            Line((1.75, -1.5), (5.75, -1.5))
            ThreePointArc((5.75, -1.5), (5.926776695, -1.573223305), (6, -1.75))
        make_face(mode=Mode.SUBTRACT)
        with BuildLine():
            Line((6, 5.75), (6, 1.75))
            ThreePointArc((6, 1.75), (5.926776695, 1.573223305), (5.75, 1.5))
            Line((5.75, 1.5), (1.75, 1.5))
            ThreePointArc((1.75, 1.5), (1.573223305, 1.573223305), (1.5, 1.75))
            Line((1.5, 1.75), (1.5, 5.75))
            ThreePointArc((1.5, 5.75), (1.573223305, 5.926776695), (1.75, 6))
            Line((1.75, 6), (5.75, 6))
            ThreePointArc((5.75, 6), (5.926776695, 5.926776695), (6, 5.75))
        make_face(mode=Mode.SUBTRACT)
        with BuildLine():
            Line((-1.5, 5.75), (-1.5, 1.75))
            ThreePointArc((-1.5, 1.75), (-1.573223305, 1.573223305), (-1.75, 1.5))
            Line((-1.75, 1.5), (-5.75, 1.5))
            ThreePointArc((-5.75, 1.5), (-5.926776695, 1.573223305), (-6, 1.75))
            Line((-6, 1.75), (-6, 5.75))
            ThreePointArc((-6, 5.75), (-5.926776695, 5.926776695), (-5.75, 6))
            Line((-5.75, 6), (-1.75, 6))
            ThreePointArc((-1.75, 6), (-1.573223305, 5.926776695), (-1.5, 5.75))
        make_face(mode=Mode.SUBTRACT)
    extrude(amount=MIRROR2_COPY_1_DEPTH)


with BuildPart() as part_1:
    # Scale1: scaled about (0, 3.432185883, -1.470574169)
    add(part.part.scale(SCALE1_SCALE).moved(Location((0, -30.889672947, 13.235167521))))


solid = part_1.part
